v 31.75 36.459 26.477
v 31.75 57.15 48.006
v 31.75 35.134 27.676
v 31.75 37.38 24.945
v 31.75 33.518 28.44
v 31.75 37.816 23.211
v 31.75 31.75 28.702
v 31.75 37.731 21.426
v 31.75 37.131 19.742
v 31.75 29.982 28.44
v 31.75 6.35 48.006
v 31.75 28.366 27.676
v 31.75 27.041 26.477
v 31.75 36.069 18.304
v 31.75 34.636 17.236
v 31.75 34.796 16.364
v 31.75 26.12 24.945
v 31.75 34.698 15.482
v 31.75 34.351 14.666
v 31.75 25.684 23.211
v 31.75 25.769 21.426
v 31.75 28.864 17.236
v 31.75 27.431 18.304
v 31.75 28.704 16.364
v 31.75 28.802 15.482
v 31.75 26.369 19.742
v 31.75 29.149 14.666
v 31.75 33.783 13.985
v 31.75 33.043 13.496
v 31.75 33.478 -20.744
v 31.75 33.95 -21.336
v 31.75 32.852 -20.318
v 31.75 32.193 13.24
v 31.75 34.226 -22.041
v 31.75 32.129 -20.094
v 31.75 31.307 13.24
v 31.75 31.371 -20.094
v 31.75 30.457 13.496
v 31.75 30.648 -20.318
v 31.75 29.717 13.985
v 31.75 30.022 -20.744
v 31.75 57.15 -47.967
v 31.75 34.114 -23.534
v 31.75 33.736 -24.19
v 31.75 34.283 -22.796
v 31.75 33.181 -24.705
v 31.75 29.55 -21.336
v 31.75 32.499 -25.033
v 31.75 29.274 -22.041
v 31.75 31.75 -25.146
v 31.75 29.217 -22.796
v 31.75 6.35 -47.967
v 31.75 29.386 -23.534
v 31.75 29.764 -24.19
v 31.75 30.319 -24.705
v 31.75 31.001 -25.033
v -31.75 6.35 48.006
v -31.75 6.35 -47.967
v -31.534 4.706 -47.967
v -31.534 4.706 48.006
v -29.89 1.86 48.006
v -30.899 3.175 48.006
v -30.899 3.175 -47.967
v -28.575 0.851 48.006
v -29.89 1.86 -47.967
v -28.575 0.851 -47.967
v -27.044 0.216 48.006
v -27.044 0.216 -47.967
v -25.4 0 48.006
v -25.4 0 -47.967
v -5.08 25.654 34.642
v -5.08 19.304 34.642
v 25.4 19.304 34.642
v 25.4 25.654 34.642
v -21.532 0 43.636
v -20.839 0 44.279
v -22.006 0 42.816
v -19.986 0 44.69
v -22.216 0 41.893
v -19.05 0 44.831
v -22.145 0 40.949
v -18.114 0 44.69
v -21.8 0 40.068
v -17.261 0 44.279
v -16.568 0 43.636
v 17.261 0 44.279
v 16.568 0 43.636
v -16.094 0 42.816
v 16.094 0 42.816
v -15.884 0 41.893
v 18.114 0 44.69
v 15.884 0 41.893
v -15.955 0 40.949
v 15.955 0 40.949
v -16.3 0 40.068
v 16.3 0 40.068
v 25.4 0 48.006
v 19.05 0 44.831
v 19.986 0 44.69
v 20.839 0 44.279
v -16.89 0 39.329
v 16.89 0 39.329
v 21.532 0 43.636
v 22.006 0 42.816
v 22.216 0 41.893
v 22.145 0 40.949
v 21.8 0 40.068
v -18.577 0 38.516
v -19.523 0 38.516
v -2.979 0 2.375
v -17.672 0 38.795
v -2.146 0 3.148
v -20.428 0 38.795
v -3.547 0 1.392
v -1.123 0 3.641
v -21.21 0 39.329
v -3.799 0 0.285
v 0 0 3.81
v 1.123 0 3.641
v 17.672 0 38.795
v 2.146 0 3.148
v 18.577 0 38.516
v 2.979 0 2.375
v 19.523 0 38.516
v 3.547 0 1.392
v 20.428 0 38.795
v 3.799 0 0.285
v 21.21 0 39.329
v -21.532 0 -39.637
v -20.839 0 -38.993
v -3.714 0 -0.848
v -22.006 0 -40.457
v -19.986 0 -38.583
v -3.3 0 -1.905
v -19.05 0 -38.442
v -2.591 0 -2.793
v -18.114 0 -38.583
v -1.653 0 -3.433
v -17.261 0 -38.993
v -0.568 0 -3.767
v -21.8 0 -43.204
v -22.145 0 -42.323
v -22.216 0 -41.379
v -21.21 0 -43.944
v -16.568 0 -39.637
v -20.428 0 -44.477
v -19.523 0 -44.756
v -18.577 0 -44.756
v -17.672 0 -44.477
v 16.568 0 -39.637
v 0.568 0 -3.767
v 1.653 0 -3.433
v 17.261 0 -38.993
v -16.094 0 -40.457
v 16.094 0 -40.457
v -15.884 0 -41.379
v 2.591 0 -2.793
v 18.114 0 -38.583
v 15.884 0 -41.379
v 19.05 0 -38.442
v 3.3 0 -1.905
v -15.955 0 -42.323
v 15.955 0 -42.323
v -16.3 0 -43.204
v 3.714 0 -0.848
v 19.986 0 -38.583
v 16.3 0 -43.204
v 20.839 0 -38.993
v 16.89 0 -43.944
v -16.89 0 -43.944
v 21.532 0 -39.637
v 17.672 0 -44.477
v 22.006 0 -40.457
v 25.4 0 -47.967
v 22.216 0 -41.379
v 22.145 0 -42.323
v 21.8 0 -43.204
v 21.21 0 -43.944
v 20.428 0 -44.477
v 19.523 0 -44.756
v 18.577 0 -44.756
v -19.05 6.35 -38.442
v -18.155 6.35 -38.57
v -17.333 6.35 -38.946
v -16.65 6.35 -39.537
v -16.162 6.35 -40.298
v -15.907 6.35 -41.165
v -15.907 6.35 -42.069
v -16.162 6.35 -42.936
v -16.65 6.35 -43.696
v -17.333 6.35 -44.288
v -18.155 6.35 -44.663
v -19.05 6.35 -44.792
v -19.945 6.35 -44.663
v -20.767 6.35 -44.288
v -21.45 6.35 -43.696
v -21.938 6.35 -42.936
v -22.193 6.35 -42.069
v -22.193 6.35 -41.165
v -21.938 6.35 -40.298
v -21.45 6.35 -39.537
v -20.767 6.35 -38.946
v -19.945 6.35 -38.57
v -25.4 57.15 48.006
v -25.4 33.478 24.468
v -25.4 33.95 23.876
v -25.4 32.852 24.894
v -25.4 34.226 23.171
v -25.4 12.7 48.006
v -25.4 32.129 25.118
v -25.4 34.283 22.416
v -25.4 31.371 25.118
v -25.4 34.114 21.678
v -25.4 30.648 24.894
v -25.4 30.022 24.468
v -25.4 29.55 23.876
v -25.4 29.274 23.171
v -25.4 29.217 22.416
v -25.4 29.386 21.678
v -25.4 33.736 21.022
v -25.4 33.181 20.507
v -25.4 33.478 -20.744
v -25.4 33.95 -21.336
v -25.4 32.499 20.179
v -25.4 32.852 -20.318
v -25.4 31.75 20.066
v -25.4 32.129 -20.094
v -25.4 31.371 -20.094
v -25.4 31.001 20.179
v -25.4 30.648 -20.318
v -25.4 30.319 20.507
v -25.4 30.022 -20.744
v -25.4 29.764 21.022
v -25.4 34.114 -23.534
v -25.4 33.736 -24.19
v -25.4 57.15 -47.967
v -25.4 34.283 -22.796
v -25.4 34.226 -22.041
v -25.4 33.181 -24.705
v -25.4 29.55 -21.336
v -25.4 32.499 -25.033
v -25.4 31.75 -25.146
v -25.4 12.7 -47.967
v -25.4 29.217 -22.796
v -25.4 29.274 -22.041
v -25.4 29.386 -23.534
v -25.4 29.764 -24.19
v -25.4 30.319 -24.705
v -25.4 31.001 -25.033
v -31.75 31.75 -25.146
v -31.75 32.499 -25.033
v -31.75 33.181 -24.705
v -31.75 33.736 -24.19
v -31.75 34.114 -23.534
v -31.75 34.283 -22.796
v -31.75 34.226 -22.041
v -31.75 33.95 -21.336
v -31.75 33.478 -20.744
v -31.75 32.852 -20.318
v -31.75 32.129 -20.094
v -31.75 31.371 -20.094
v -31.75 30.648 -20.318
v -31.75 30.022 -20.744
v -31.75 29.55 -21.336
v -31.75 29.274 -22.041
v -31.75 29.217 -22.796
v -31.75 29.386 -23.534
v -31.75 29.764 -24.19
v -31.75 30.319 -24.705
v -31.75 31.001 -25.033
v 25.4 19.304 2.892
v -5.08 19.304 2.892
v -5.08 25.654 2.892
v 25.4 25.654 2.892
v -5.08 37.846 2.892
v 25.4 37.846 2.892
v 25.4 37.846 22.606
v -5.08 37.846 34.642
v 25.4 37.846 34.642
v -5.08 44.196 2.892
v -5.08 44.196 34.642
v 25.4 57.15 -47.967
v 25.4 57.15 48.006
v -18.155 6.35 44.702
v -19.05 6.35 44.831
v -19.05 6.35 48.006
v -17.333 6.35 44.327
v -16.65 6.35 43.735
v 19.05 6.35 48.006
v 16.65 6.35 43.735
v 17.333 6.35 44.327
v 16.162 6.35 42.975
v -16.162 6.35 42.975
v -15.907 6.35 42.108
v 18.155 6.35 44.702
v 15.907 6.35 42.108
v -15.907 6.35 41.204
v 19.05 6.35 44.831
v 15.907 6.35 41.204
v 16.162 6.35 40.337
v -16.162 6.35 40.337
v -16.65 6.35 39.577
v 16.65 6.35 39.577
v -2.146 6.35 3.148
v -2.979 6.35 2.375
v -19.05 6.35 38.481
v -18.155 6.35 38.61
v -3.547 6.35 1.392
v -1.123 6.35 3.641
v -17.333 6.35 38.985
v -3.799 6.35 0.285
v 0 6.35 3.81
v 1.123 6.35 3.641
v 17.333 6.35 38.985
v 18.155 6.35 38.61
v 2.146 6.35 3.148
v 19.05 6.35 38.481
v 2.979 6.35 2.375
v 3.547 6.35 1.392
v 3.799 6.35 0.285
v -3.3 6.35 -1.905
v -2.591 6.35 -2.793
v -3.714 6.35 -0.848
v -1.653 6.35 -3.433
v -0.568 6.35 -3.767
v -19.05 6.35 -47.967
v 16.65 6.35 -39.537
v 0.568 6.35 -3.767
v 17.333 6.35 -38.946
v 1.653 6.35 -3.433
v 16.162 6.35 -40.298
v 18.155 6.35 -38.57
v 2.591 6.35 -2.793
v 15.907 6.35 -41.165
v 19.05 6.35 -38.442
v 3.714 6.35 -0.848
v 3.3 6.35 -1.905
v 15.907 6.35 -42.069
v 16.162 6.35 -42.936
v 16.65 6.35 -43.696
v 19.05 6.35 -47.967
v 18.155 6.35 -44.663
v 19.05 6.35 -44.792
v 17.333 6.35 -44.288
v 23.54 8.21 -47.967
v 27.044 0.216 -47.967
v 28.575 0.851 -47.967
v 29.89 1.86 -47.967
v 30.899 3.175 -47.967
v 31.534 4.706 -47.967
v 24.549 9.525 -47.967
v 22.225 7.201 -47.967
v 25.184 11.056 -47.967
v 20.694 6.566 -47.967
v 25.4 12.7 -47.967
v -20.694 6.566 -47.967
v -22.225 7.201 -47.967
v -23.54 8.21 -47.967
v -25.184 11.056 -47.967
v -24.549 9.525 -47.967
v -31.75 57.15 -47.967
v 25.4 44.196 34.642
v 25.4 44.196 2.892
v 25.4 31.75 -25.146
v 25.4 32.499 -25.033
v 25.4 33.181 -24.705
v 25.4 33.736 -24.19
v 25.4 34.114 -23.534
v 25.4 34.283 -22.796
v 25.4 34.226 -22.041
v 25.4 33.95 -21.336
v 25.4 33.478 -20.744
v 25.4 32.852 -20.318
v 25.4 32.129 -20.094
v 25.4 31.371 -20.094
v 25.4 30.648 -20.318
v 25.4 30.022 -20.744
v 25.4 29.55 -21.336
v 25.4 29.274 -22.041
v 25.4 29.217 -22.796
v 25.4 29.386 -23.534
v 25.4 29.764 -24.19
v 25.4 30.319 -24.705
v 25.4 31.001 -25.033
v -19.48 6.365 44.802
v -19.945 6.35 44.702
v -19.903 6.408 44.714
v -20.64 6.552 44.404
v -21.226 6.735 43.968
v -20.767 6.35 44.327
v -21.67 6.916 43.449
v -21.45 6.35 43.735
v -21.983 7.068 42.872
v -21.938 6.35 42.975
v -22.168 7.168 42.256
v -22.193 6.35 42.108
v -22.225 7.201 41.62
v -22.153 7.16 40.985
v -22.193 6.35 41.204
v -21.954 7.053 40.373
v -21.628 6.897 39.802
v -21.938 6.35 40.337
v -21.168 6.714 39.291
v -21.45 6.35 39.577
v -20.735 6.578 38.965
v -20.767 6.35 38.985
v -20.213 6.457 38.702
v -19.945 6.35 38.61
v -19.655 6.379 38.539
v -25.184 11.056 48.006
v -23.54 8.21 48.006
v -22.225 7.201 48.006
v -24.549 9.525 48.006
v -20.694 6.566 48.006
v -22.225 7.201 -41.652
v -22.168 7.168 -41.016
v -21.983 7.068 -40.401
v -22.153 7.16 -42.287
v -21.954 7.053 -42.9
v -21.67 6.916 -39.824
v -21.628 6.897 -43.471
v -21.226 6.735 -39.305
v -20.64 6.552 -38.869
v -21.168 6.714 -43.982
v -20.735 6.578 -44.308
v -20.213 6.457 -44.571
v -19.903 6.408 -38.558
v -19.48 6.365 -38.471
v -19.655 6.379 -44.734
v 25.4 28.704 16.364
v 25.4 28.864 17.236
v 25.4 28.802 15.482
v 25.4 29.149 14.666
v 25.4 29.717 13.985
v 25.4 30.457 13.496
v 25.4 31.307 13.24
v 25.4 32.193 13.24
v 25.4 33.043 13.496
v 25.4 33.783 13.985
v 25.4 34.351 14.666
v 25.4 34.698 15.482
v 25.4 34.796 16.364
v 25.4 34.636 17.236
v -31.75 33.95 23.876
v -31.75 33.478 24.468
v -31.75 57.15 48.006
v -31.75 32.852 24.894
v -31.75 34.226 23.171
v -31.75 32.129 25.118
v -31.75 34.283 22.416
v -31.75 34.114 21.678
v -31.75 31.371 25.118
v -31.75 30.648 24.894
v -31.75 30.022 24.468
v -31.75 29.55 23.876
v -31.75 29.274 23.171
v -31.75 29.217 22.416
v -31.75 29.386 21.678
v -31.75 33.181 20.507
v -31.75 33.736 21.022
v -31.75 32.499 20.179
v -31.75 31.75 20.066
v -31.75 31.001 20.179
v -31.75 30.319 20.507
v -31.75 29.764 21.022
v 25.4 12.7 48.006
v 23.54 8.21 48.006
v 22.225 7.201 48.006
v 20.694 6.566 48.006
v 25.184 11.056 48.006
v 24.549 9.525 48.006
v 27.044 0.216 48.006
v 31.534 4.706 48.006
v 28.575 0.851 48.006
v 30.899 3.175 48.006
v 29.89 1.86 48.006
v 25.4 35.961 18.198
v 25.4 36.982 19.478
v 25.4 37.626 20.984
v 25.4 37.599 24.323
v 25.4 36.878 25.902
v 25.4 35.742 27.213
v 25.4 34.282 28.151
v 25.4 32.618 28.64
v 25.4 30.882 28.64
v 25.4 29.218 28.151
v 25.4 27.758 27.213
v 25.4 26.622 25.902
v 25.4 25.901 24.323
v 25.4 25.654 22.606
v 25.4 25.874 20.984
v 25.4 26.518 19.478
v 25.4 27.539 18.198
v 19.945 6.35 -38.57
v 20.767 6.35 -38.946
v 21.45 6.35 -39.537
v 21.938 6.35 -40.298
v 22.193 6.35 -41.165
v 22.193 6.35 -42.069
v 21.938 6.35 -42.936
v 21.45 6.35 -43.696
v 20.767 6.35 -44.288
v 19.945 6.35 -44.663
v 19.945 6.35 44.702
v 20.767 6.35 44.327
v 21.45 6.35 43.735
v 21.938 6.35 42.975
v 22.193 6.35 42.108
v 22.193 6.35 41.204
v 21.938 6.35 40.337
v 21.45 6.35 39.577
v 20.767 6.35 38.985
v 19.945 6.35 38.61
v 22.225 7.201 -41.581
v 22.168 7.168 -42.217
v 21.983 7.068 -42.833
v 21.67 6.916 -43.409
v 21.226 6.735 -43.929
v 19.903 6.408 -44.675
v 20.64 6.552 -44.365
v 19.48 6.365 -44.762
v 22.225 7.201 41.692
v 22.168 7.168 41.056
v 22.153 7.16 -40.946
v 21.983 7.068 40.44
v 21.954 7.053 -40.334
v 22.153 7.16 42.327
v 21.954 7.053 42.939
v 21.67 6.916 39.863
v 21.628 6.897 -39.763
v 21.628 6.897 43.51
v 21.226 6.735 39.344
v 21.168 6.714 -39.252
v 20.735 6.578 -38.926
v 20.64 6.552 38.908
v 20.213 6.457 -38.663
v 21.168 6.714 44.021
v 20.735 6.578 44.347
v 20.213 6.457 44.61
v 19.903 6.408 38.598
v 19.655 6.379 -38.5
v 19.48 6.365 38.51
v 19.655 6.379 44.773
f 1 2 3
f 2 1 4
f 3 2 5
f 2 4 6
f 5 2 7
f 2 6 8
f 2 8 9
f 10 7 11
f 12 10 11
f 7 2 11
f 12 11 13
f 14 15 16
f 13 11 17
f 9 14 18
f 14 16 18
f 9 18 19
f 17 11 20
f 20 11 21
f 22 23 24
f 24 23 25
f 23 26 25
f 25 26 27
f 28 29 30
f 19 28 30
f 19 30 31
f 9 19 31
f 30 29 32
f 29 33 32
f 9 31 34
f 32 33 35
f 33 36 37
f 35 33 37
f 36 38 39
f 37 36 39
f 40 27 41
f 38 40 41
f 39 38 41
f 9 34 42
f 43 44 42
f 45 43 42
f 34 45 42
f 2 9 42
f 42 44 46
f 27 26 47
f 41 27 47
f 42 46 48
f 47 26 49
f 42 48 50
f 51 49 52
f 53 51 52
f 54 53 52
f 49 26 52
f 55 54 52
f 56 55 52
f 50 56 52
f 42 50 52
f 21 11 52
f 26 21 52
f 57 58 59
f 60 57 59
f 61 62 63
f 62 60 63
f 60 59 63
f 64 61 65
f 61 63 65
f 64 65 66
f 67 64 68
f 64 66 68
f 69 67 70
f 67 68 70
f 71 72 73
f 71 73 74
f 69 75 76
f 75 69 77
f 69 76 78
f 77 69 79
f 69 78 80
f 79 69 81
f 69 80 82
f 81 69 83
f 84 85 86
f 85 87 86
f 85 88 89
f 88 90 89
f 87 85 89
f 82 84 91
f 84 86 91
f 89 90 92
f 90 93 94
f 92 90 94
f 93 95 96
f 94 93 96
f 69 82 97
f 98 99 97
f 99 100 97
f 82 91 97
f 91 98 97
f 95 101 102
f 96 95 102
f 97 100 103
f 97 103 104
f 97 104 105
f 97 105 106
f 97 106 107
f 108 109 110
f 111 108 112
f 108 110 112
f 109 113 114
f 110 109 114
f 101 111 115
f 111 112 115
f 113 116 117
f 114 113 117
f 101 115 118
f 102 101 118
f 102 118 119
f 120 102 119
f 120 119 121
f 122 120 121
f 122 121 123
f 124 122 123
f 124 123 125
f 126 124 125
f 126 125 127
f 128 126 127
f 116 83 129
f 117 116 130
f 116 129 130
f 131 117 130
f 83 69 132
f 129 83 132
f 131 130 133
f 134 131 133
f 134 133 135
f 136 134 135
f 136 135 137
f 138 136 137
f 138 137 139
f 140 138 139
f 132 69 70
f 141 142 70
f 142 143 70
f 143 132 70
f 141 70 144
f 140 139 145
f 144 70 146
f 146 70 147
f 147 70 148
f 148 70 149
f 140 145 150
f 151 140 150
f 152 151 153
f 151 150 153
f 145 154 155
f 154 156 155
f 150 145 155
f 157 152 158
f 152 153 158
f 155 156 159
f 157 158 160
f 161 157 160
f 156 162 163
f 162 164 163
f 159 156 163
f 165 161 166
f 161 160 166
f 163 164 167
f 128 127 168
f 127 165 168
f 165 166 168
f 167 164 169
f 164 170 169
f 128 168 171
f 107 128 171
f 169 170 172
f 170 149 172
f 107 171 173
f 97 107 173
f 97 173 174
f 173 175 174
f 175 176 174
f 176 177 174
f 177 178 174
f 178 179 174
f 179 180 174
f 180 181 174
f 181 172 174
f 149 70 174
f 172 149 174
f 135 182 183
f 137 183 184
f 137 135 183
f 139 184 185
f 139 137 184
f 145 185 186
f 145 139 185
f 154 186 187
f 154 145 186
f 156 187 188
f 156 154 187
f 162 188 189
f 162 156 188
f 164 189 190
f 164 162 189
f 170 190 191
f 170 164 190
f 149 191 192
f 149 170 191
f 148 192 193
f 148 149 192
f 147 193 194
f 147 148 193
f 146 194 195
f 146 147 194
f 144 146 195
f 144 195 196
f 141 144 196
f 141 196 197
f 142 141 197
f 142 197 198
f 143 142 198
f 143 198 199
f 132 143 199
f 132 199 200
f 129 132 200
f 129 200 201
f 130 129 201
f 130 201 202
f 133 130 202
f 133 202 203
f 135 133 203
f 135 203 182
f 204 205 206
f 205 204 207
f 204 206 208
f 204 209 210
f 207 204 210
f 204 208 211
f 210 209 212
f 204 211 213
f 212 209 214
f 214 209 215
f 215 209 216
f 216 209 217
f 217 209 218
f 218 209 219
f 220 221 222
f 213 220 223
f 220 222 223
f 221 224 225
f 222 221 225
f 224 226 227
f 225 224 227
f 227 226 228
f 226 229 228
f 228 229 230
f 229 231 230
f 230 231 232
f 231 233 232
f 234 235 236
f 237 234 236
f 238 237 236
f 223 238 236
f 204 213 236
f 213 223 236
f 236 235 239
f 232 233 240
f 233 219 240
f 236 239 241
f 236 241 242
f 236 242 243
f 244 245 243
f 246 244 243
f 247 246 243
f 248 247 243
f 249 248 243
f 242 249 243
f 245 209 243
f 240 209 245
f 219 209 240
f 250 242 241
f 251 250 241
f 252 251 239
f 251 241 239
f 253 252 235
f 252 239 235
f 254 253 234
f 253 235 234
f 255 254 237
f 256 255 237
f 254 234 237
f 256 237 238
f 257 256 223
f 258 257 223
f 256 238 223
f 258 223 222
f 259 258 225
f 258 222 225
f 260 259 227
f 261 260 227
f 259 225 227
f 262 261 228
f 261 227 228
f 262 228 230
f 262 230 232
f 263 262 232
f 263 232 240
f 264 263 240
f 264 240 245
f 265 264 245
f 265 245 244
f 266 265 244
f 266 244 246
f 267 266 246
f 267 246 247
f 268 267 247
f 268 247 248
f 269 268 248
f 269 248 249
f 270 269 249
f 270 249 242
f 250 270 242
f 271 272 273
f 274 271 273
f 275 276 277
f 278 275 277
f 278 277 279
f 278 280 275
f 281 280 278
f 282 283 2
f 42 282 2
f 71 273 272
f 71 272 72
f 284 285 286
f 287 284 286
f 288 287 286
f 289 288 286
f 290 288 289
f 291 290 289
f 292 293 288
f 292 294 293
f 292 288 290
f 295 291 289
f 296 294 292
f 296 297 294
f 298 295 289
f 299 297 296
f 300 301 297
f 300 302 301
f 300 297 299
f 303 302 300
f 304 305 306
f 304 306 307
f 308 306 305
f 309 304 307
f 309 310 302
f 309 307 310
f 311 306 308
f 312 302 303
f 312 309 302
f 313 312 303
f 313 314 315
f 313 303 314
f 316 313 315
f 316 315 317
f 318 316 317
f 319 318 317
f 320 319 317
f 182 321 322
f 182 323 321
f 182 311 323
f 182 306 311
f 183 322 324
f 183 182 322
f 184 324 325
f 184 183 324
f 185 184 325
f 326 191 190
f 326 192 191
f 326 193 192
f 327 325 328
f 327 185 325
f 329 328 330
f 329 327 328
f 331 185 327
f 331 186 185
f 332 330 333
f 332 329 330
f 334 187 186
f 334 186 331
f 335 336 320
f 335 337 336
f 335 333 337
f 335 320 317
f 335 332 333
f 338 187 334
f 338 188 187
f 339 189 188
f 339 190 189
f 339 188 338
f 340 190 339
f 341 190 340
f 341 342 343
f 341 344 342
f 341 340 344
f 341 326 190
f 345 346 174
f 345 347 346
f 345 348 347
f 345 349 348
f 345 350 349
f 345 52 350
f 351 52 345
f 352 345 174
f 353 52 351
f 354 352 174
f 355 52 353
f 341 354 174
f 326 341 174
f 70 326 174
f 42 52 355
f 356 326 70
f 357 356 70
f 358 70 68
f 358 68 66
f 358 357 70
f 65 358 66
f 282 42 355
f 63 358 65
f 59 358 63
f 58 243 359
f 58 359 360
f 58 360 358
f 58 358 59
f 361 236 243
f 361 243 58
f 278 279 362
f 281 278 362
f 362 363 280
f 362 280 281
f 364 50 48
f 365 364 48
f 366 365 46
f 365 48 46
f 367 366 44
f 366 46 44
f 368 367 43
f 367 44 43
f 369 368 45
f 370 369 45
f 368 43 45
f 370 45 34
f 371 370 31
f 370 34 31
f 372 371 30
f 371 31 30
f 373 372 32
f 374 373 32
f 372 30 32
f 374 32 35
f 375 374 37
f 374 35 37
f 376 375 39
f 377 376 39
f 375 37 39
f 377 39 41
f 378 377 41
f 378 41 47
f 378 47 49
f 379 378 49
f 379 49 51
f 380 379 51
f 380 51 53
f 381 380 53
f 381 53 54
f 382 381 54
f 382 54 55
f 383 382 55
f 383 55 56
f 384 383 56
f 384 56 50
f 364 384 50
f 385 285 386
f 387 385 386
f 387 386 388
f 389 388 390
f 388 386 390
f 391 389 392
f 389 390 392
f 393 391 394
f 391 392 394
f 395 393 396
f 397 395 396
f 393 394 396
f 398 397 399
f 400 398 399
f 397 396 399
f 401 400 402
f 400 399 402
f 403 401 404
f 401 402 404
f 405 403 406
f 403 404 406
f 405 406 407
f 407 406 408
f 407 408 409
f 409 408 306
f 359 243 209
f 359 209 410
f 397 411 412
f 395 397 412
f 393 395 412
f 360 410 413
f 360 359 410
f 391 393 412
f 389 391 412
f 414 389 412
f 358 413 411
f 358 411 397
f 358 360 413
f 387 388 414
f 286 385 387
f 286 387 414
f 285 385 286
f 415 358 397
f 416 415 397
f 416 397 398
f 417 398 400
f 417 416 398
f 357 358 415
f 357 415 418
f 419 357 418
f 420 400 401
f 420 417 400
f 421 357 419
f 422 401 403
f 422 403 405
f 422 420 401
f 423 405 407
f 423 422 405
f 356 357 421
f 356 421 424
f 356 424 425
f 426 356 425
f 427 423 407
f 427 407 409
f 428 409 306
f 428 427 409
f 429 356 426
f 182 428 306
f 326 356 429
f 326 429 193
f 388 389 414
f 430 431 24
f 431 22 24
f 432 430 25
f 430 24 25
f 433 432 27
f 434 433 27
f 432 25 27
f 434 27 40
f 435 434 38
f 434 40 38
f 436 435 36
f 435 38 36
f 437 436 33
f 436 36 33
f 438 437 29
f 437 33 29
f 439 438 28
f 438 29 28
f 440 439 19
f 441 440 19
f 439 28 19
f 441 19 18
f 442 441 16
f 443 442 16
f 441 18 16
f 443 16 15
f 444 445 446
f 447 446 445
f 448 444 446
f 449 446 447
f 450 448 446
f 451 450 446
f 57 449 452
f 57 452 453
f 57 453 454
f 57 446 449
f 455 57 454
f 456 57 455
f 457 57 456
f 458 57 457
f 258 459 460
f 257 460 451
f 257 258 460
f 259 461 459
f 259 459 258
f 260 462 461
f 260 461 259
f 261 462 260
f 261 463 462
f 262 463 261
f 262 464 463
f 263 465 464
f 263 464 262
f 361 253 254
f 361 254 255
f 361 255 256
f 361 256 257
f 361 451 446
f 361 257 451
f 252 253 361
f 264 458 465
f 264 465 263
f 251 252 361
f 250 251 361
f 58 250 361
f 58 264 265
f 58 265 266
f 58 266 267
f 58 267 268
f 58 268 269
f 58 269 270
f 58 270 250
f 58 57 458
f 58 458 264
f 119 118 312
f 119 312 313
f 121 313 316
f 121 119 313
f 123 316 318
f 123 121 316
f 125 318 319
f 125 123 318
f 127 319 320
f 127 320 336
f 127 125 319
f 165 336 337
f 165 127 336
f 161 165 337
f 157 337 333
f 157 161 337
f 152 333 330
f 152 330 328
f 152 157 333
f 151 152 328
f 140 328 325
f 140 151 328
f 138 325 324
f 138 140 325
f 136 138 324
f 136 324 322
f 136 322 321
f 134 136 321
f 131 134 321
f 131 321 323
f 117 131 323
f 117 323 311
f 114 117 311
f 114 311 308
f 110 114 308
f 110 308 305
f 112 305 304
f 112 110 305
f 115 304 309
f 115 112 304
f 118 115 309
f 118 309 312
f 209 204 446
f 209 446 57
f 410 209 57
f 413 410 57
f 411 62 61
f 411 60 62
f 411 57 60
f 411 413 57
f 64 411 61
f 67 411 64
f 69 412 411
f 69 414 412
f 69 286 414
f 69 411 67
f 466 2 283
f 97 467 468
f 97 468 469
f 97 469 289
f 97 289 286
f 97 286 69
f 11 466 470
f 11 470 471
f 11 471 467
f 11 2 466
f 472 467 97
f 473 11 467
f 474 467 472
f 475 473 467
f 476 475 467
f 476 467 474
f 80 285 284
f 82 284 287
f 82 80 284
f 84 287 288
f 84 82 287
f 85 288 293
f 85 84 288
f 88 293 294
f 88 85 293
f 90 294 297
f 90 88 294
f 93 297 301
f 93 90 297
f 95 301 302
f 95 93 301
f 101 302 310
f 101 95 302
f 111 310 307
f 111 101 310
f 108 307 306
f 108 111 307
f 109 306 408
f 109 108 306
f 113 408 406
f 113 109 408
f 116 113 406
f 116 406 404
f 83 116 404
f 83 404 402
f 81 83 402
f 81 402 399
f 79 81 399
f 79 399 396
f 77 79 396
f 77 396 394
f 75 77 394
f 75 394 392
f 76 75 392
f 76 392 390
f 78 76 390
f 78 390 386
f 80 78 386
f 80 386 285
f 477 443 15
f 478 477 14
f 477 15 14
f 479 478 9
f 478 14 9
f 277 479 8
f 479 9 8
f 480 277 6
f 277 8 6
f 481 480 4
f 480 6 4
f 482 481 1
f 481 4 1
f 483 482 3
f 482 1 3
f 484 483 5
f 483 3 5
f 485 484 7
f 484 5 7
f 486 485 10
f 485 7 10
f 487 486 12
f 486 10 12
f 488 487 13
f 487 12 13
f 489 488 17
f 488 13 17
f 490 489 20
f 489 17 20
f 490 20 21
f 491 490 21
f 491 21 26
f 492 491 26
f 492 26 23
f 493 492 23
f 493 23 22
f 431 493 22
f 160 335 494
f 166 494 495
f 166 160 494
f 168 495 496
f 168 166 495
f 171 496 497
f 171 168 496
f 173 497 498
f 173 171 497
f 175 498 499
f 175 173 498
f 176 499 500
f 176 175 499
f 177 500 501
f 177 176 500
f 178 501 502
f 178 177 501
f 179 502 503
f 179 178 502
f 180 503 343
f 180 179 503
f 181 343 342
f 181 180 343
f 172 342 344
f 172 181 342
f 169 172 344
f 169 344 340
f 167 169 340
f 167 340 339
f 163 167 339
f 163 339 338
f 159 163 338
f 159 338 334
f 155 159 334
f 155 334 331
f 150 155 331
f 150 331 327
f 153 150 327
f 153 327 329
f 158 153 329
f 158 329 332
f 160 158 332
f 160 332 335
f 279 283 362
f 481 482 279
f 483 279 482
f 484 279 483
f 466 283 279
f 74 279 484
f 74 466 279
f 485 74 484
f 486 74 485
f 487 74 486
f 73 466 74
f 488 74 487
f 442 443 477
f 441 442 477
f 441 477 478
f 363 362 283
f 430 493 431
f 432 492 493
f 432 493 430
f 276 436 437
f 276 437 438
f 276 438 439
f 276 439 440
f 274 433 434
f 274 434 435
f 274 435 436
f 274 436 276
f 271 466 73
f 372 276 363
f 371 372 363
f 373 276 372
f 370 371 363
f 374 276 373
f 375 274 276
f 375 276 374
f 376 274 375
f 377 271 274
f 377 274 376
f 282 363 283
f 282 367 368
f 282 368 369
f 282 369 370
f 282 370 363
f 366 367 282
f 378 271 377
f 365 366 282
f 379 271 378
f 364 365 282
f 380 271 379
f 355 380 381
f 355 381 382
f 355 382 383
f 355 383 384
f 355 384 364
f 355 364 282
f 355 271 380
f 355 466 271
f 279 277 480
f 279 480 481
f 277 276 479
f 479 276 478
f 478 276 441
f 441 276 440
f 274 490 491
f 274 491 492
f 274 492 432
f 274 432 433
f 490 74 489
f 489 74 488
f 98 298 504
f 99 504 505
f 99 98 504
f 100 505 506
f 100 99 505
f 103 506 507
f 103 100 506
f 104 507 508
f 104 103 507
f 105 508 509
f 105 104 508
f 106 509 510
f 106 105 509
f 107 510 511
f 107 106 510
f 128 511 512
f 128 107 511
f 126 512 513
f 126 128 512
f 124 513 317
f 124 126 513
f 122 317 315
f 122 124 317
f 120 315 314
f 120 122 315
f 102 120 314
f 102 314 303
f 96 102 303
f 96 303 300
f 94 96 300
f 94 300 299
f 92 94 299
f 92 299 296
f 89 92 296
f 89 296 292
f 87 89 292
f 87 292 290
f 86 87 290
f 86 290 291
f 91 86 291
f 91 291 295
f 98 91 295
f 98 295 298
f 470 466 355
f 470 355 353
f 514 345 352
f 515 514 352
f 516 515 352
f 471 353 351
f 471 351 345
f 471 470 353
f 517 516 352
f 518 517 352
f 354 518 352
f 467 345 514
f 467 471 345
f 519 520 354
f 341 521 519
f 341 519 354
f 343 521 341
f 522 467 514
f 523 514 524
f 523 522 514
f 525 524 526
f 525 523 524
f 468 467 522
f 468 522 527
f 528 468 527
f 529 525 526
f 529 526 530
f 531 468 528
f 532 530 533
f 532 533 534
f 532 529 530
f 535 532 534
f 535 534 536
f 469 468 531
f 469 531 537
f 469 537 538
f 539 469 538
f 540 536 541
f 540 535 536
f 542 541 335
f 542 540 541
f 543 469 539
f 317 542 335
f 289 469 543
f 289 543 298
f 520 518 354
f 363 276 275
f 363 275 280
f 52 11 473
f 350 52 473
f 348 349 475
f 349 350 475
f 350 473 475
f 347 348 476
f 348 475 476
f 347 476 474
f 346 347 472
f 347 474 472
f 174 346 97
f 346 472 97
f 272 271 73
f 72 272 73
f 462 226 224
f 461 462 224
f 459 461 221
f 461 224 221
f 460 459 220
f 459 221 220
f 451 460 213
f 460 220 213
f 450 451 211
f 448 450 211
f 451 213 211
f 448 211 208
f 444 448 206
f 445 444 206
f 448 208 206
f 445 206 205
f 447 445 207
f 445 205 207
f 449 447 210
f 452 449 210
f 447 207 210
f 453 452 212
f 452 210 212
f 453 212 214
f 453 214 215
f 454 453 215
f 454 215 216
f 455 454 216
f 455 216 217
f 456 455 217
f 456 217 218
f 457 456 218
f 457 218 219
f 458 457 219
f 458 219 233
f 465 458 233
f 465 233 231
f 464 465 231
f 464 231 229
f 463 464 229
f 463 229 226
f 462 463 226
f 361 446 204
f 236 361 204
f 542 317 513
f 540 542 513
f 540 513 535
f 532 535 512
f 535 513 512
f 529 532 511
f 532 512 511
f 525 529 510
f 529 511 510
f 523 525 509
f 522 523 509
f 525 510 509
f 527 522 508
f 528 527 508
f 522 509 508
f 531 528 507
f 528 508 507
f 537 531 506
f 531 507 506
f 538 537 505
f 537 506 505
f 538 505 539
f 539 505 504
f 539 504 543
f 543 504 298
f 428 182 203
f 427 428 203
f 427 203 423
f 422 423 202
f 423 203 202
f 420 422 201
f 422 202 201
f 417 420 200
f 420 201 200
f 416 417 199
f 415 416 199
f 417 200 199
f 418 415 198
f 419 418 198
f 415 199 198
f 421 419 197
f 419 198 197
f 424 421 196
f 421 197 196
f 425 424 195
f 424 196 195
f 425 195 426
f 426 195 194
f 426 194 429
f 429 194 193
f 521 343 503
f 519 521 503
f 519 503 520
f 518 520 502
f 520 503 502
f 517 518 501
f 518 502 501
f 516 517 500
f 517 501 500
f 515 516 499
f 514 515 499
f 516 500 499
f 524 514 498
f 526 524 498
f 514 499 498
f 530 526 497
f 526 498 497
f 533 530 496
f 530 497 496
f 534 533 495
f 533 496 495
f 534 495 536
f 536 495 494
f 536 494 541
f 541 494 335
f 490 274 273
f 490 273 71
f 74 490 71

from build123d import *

# Parameters (mm, degrees)
SKETCH1_W           = 50.8
SKETCH1_H           = 95.972651844
SKETCH1_R           = 3.175
SKETCH1_R_2         = 3.81
BOSS_EXTRUDE1_DEPTH = 6.35
SKETCH1_3_W         = 6.35
SKETCH1_3_H         = 95.972651844
BOSS_EXTRUDE2_DEPTH = 57.15
FILLET1_R           = 6.35
SKETCH2_R           = 6.096
SKETCH2_R_2         = 2.54
SKETCH2_R_3         = 3.048
CUT_EXTRUDE1_DEPTH  = 6.35
CUT_EXTRUDE2_REACH  = 99.995
SKETCH2_4_R         = 2.54
SKETCH3_W           = 31.75
SKETCH3_H           = 6.35
BOSS_EXTRUDE4_DEPTH = 30.48


with BuildPart() as part:
    # Sketch1 → Boss-Extrude1 (new body)
    with BuildSketch(Plane(origin=(0, 0, 0), x_dir=(1, 0, 0), z_dir=(0, 1, 0))):
        with Locations((0, -0.019674078)):
            Rectangle(SKETCH1_W, SKETCH1_H)
        with Locations(Location((-19.05, -41.656, 0), (0, 0, 270))):
            Circle(SKETCH1_R, mode=Mode.SUBTRACT)
        with Locations(Location((19.05, -41.656, 0), (0, 0, 270))):
            Circle(SKETCH1_R, mode=Mode.SUBTRACT)
        with Locations(Location((-19.05, 41.616651844, 0), (0, 0, 270))):
            Circle(SKETCH1_R, mode=Mode.SUBTRACT)
        with Locations(Location((0, 0, 0), (0, 0, 270))):
            Circle(SKETCH1_R_2, mode=Mode.SUBTRACT)
        with Locations(Location((19.05, 41.616651844, 0), (0, 0, 270))):
            Circle(SKETCH1_R, mode=Mode.SUBTRACT)
    extrude(amount=BOSS_EXTRUDE1_DEPTH)

    # Sketch1<3> → Boss-Extrude2 (add)
    with BuildSketch(Plane(origin=(0, 0, 0), x_dir=(1, 0, 0), z_dir=(0, 1, 0))):
        with Locations((-28.575, -0.019674078)):
            Rectangle(SKETCH1_3_W, SKETCH1_3_H)
        with Locations((28.575, -0.019674078)):
            Rectangle(SKETCH1_3_W, SKETCH1_3_H)
    extrude(amount=BOSS_EXTRUDE2_DEPTH)

    # Fillet1
    # the kernel refuses this fillet: 6.35 mm, written as the material it adds along each edge
    with BuildSketch(Plane(origin=(25.4, 6.35, 48.006), x_dir=(0, 1, 0), z_dir=(0, 0, -1))) as fillet1_piece_1_section:
        with BuildLine():
            CenterArc((FILLET1_R, -FILLET1_R), FILLET1_R, 90, 90)
            Line((0, -FILLET1_R), (0, 0))
            Line((0, 0), (FILLET1_R, 0))
        make_face()
    fillet1_piece_1 = extrude(amount=95.972651844, mode=Mode.PRIVATE)
    fillet1_piece_1 = fillet1_piece_1 - Plane(origin=(19.05, 7.801972373, 41.656), x_dir=(0, 0, 1), z_dir=(0, -1, 0)) * Cylinder(3.175, 218, mode=Mode.PRIVATE)
    fillet1_piece_1 = fillet1_piece_1 - Plane(origin=(19.05, 7.801972373, -41.616651844), x_dir=(0, 0, 1), z_dir=(0, -1, 0)) * Cylinder(3.175, 218, mode=Mode.PRIVATE)
    add(fillet1_piece_1)
    with BuildSketch(Plane(origin=(-25.4, 6.35, -47.966651844), x_dir=(1, 0, 0), z_dir=(0, 0, 1))) as fillet1_piece_2_section:
        with BuildLine():
            CenterArc((FILLET1_R, FILLET1_R), FILLET1_R, 180, 90)
            Line((0, FILLET1_R), (0, 0))
            Line((0, 0), (FILLET1_R, 0))
        make_face()
    fillet1_piece_2 = extrude(amount=95.972651844, mode=Mode.PRIVATE)
    fillet1_piece_2 = fillet1_piece_2 - Plane(origin=(-19.05, 7.801971704, 41.656), x_dir=(0, 0, 1), z_dir=(0, -1, 0)) * Cylinder(3.175, 218, mode=Mode.PRIVATE)
    fillet1_piece_2 = fillet1_piece_2 - Plane(origin=(-19.05, 7.801971704, -41.616651844), x_dir=(0, 0, 1), z_dir=(0, -1, 0)) * Cylinder(3.175, 218, mode=Mode.PRIVATE)
    add(fillet1_piece_2)
    # the kernel refuses this fillet: 6.35 mm, written as the material it takes off along each edge
    with BuildSketch(Plane(origin=(-31.75, 0, -63.841651844), x_dir=(1, 0, 0), z_dir=(0, 0, 1)), Plane(origin=(31.75, 0, 63.881), x_dir=(-1, 0, 0), z_dir=(0, 0, -1))) as fillet1_2_piece_1:
        with BuildLine():
            CenterArc((FILLET1_R, FILLET1_R), FILLET1_R, 180, 90)
            Line((0, FILLET1_R), (0, 0))
            Line((0, 0), (FILLET1_R, 0))
        make_face()
    extrude(amount=127.722651844, mode=Mode.SUBTRACT)

    # Sketch2 → Cut-Extrude1 (cut)
    # profile 1 of 6: a face of its own
    with BuildSketch(Plane(origin=(31.75, 0, 0), x_dir=(0, 0, -1), z_dir=(1, 0, 0))):
        with Locations((-22.606, 31.75)):
            Circle(SKETCH2_R)
        with Locations((-22.606, 31.75)):
            Circle(SKETCH2_R_2, mode=Mode.SUBTRACT)
    # profile 2 of 6: a face of its own
    with BuildSketch(Plane(origin=(31.75, 0, 0), x_dir=(0, 0, -1), z_dir=(1, 0, 0))):
        with Locations((-22.606, 31.75)):
            Circle(SKETCH2_R_2)
    # profile 3 of 6: a face of its own
    with BuildSketch(Plane(origin=(31.75, 0, 0), x_dir=(0, 0, -1), z_dir=(1, 0, 0))):
        with Locations((-22.606, 31.75)):
            Circle(SKETCH2_R)
    # profile 4 of 6: a face of its own
    with BuildSketch(Plane(origin=(31.75, 0, 0), x_dir=(0, 0, -1), z_dir=(1, 0, 0))):
        with Locations((-16.256, 31.75)):
            Circle(SKETCH2_R_3)
    # profile 5 of 6: a face of its own
    with BuildSketch(Plane(origin=(31.75, 0, 0), x_dir=(0, 0, -1), z_dir=(1, 0, 0))):
        with Locations((-22.606, 31.75)):
            Circle(SKETCH2_R)
    # profile 6 of 6: a face of its own
    with BuildSketch(Plane(origin=(31.75, 0, 0), x_dir=(0, 0, -1), z_dir=(1, 0, 0))):
        with Locations((-16.256, 31.75)):
            Circle(SKETCH2_R_3)
    extrude(amount=-CUT_EXTRUDE1_DEPTH, mode=Mode.SUBTRACT)

    # Cut-Extrude2: up to this face of the body (flat: up to its plane)
    cut_extrude2_end = Plane(part.part.faces().sort_by_distance((-31.75, 31.75, 0.019674078))[0])
    # Sketch2<4> → Cut-Extrude2 (cut, up to the picked face)
    with BuildSketch(Plane(origin=(31.75, 0, 0), x_dir=(0, 0, -1), z_dir=(1, 0, 0)), mode=Mode.PRIVATE) as cut_extrude2_sk1:
        with Locations((22.606, 31.75)):
            Circle(SKETCH2_4_R)
    cut_extrude2_tool1 = split(extrude(cut_extrude2_sk1.sketch, amount=-CUT_EXTRUDE2_REACH, mode=Mode.PRIVATE), bisect_by=cut_extrude2_end, keep=Keep.BOTH, mode=Mode.PRIVATE)
    # Sketch2<4> → Cut-Extrude2 (cut, up to the picked face)
    with BuildSketch(Plane(origin=(31.75, 0, 0), x_dir=(0, 0, -1), z_dir=(1, 0, 0)), mode=Mode.PRIVATE) as cut_extrude2_sk2:
        with Locations((-22.606, 31.75)):
            Circle(SKETCH2_4_R)
    cut_extrude2_tool2 = split(extrude(cut_extrude2_sk2.sketch, amount=-CUT_EXTRUDE2_REACH, mode=Mode.PRIVATE), bisect_by=cut_extrude2_end, keep=Keep.BOTH, mode=Mode.PRIVATE)
    add(cut_extrude2_tool1.solids().sort_by(Axis((31.75, 31.75, -22.606), (-1, 0, 0)))[0], mode=Mode.SUBTRACT)
    add(cut_extrude2_tool2.solids().sort_by(Axis((31.75, 31.75, 22.606), (-1, 0, 0)))[0], mode=Mode.SUBTRACT)

    # Sketch3 → Boss-Extrude4 (add)
    with BuildSketch(Plane.ZY.offset(-25.4)):
        with Locations((18.766859732, 22.479)):
            Rectangle(SKETCH3_W, SKETCH3_H)
        with Locations((18.766859732, 41.021)):
            Rectangle(SKETCH3_W, SKETCH3_H)
    extrude(amount=BOSS_EXTRUDE4_DEPTH)


solid = part.part
